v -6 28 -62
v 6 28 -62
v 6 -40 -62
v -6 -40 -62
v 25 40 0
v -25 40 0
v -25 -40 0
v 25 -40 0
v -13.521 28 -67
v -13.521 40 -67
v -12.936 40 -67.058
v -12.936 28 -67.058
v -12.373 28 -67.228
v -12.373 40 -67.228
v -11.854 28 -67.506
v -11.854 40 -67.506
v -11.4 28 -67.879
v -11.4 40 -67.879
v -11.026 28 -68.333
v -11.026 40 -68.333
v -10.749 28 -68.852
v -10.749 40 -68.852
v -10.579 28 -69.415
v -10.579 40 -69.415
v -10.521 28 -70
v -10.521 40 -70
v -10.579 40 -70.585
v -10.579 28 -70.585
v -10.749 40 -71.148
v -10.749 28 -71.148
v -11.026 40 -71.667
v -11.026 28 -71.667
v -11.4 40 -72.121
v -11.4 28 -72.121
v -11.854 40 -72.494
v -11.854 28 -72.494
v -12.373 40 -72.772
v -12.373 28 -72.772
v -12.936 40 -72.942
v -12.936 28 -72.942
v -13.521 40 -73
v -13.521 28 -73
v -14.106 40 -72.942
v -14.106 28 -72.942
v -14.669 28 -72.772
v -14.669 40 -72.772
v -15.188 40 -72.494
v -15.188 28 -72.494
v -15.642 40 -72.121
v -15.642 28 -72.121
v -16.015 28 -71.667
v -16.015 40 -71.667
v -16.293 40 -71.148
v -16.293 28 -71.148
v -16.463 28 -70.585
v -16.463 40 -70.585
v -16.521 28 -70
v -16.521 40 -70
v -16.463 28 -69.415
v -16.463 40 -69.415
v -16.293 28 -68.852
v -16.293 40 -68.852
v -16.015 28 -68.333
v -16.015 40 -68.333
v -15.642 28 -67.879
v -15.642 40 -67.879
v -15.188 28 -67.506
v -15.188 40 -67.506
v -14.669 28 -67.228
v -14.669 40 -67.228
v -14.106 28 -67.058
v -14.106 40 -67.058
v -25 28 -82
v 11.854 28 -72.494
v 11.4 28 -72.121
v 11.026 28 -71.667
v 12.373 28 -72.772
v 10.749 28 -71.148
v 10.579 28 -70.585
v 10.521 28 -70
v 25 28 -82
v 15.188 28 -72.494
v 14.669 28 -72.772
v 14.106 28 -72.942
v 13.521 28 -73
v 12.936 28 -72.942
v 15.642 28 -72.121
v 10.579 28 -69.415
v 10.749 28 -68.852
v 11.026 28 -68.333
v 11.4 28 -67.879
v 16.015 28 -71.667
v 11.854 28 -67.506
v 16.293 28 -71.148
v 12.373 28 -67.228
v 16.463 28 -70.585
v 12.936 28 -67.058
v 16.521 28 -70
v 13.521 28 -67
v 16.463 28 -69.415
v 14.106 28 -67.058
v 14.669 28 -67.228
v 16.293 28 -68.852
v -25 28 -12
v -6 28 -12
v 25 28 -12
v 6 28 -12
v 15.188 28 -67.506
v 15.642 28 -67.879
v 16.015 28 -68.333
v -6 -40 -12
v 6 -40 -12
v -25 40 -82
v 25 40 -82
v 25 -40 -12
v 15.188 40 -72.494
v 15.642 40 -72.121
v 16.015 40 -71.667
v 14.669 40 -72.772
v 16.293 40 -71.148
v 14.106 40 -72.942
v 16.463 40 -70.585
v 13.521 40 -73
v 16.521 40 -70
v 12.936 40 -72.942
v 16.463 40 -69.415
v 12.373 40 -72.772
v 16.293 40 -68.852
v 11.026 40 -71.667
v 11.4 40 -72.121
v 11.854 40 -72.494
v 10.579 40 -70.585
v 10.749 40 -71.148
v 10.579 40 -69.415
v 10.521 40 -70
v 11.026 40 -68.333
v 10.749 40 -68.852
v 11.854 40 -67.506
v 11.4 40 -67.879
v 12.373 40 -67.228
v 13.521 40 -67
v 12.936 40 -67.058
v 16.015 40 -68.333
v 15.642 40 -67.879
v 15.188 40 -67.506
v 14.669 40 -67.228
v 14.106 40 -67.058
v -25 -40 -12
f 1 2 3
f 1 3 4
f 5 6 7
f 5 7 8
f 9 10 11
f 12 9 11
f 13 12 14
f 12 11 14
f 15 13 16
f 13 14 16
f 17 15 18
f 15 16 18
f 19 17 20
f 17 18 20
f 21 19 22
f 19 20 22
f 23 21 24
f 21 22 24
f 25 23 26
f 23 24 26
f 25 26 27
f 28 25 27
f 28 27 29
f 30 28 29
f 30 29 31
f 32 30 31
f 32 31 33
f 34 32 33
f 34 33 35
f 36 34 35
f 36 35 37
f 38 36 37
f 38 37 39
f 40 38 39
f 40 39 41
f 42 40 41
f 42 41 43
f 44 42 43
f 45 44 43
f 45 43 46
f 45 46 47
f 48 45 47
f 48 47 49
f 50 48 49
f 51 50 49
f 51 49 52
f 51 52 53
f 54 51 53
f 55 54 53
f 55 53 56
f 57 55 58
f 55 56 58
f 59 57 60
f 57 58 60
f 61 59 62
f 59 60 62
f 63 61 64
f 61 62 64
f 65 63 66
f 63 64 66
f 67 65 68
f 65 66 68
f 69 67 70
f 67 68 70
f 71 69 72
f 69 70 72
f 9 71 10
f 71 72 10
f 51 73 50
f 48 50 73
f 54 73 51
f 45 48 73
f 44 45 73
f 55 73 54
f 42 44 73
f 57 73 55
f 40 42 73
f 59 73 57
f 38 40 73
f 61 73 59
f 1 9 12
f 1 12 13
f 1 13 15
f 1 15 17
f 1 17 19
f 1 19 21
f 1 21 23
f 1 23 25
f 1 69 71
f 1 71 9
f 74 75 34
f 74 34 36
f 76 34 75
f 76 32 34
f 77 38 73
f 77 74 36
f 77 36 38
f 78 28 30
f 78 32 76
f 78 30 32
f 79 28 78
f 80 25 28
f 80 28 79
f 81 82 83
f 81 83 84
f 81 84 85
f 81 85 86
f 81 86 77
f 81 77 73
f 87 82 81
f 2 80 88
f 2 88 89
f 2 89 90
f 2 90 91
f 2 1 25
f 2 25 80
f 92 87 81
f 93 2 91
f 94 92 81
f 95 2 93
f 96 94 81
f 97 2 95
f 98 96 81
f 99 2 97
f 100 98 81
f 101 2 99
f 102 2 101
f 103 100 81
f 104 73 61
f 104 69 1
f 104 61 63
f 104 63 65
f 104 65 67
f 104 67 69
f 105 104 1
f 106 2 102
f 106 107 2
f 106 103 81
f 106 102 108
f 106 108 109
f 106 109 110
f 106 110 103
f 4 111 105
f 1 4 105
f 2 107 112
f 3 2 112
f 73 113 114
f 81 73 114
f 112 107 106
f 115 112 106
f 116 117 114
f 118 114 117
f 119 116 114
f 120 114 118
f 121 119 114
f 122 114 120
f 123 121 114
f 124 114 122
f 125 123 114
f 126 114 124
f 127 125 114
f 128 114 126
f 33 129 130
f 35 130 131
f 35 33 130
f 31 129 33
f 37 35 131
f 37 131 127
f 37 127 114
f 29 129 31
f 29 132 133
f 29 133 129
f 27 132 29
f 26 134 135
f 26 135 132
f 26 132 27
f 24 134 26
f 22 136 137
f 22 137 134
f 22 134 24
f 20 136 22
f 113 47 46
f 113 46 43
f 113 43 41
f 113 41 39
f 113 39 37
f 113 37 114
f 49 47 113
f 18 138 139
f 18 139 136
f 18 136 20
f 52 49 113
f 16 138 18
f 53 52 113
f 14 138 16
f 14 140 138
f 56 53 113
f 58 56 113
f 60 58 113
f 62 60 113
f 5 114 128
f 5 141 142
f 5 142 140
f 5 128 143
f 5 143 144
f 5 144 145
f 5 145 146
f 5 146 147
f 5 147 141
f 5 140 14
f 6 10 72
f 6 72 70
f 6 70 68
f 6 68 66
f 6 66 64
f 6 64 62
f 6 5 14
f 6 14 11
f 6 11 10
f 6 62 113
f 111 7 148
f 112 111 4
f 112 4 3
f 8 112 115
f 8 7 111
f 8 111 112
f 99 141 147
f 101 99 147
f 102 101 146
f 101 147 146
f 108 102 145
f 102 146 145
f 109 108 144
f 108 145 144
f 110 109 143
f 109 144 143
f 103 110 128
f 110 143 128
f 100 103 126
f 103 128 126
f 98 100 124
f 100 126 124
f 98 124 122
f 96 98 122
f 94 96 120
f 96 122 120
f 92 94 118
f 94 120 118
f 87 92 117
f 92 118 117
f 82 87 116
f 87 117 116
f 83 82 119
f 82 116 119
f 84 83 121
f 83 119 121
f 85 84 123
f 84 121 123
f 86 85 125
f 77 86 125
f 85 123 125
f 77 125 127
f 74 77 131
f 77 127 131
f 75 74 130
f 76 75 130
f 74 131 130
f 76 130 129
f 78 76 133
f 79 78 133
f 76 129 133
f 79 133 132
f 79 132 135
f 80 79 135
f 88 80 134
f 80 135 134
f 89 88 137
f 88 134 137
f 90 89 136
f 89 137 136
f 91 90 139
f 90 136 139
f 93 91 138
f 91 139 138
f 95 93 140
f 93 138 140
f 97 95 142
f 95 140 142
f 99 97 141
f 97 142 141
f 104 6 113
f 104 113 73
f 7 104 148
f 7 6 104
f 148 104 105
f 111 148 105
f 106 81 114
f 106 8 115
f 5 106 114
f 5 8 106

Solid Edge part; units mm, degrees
sketch "Sketch1" plane through (0, 0, 0) normal (0, 0, 1) x (1, 0, 0)
  line L0 (25, -40) -> (25, 40)
  line L1 (25, 40) -> (-25, 40)
  line L2 (-25, 40) -> (-25, -40)
  line L3 (-25, -40) -> (25, -40)
extrude "Protrusion1" add sketch "Sketch1" against normal blind 12
sketch "Sketch2" plane through (0, 0, -12) normal (0, 0, -1) x (0, -1, 0)
  line L0 (-40, -25) -> (-40, 25)
  line L1 (-40, 25) -> (-28, 25)
  line L2 (-28, 25) -> (-28, -25)
  line L3 (-28, -25) -> (-40, -25)
extrude "ExtrudedProtrusion_2" add sketch "Sketch2" along normal blind 70
sketch "Sketch3" plane through (0, -6, -12) normal (0, 0, -1) x (0, -1, 0)
  line L0 (34, 6) -> (-34, 6)
  line L1 (-34, 6) -> (-34, -6)
  line L2 (-34, -6) -> (34, -6)
  line L3 (34, -6) -> (34, 6)
  dimension "D1" = 12
extrude "ExtrudedProtrusion_3" add sketch "Sketch3" along normal blind 50
hole "Hole_1" at (-13.5209, 40, -70) direction (0, -1, 0) diameter 6 end up to next
hole "Hole1" at (13.5209, 40, -70) direction (0, -1, 0) diameter 6 end up to next
